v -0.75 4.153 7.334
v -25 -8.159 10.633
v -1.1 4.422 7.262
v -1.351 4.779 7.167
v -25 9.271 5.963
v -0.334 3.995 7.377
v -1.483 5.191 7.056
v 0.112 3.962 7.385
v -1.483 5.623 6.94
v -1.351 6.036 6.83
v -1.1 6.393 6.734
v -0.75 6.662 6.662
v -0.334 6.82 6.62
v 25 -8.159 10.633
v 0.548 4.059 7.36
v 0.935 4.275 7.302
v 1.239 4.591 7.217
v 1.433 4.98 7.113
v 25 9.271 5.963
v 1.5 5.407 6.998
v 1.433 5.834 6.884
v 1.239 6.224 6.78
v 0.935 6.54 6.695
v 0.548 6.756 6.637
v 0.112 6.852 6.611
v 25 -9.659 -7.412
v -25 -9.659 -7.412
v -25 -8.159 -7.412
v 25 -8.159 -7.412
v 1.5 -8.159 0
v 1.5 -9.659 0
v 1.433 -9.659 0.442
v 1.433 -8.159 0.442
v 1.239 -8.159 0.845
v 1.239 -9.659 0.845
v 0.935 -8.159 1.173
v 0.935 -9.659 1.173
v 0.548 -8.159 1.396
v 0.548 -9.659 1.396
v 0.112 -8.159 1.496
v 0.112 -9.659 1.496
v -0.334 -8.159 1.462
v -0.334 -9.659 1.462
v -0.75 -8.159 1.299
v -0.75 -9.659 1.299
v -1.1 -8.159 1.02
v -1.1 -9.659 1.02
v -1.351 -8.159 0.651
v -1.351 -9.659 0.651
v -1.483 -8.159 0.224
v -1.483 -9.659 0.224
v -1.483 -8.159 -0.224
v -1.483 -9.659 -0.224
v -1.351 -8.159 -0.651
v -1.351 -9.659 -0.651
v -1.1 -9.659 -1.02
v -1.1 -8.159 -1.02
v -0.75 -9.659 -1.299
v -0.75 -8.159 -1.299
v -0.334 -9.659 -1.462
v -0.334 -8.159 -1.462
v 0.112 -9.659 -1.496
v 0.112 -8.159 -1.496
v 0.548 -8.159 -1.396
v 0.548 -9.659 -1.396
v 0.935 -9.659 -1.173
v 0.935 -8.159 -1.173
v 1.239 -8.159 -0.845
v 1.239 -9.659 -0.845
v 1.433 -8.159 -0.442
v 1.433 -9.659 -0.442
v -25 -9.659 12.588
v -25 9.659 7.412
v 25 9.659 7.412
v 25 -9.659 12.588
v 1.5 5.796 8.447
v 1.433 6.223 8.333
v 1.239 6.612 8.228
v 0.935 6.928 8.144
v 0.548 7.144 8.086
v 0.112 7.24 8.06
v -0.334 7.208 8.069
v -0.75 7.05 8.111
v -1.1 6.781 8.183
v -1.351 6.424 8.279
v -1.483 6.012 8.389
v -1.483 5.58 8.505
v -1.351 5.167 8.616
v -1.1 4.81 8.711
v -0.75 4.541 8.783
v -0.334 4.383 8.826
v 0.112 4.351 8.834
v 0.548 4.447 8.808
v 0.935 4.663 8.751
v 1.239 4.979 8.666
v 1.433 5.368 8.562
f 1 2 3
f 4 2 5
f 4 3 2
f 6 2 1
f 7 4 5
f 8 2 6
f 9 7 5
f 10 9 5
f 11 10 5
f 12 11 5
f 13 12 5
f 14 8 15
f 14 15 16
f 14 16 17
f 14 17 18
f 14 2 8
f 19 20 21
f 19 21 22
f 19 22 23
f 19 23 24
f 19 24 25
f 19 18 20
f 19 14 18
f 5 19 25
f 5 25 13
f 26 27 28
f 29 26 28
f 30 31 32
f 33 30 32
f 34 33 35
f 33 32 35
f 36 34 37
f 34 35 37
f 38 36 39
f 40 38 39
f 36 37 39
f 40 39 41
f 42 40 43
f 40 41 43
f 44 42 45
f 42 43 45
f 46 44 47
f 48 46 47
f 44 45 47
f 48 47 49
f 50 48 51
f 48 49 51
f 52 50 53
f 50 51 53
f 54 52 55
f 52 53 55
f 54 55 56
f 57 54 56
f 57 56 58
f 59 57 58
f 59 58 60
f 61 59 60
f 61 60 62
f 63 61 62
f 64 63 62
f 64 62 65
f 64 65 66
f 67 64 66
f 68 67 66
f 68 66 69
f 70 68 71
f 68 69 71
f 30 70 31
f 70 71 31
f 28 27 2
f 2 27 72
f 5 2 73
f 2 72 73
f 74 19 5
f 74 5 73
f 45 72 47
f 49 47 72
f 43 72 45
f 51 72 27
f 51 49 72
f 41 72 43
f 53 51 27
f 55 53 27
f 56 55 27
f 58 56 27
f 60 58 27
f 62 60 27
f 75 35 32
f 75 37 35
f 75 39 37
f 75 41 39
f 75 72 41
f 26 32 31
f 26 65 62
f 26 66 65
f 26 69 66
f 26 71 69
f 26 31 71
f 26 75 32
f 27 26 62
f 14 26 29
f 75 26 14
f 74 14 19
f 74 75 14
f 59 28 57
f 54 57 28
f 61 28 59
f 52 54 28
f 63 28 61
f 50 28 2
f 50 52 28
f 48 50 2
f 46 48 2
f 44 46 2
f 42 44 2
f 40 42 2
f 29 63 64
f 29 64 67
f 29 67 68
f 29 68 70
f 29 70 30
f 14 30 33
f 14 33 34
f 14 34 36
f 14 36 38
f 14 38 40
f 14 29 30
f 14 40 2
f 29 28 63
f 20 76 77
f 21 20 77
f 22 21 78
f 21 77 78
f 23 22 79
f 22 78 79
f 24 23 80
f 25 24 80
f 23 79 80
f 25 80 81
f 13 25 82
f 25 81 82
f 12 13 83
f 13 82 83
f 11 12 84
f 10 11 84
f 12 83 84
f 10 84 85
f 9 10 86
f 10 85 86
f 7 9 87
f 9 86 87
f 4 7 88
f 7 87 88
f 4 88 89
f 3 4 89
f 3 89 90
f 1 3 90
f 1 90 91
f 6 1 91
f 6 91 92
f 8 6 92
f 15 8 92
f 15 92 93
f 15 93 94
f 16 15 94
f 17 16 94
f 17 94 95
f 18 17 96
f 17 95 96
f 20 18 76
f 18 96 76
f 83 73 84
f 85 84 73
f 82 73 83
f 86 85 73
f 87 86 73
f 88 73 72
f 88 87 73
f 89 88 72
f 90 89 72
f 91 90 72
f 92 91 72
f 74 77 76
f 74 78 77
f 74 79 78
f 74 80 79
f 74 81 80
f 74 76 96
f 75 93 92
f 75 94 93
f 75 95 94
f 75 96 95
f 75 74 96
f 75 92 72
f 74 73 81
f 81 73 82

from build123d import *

# Parameters (mm, degrees)
F1_DEPTH = 25
F2_R     = 1.5
F3_DEPTH = 1.5
F4_R     = 1.5
F5_DEPTH = 1.5


with BuildPart() as f1:
    # F0 (on Right) → F1 (new body, symmetric)
    with BuildSketch(Plane.YZ):
        Polygon((-9.6592582629, -7.411809549), (-8.1592582629, -7.411809549), (-8.1592582629, 10.6333523918), (9.2710296952, 5.9629208095), (9.6592582629, 7.411809549), (-9.6592582629, 12.588190451), align=None)
    extrude(amount=F1_DEPTH, both=True)

    # F2 (on face) → F3 (cut, through all)
    with BuildSketch(Plane.XZ.offset(9.6592582629)):
        Circle(F2_R)
    extrude(amount=-F3_DEPTH, mode=Mode.SUBTRACT)

    # F4 (on face) → F5 (cut, through all)
    with BuildSketch(Plane(origin=(0, 2.5, 9.3301270189), x_dir=(1, 0, 0), z_dir=(0, 0.2588190451, 0.9659258263))):
        with Locations((0, 3.411809549)):
            Circle(F4_R)
    extrude(amount=-F5_DEPTH, mode=Mode.SUBTRACT)


solid = f1.part
